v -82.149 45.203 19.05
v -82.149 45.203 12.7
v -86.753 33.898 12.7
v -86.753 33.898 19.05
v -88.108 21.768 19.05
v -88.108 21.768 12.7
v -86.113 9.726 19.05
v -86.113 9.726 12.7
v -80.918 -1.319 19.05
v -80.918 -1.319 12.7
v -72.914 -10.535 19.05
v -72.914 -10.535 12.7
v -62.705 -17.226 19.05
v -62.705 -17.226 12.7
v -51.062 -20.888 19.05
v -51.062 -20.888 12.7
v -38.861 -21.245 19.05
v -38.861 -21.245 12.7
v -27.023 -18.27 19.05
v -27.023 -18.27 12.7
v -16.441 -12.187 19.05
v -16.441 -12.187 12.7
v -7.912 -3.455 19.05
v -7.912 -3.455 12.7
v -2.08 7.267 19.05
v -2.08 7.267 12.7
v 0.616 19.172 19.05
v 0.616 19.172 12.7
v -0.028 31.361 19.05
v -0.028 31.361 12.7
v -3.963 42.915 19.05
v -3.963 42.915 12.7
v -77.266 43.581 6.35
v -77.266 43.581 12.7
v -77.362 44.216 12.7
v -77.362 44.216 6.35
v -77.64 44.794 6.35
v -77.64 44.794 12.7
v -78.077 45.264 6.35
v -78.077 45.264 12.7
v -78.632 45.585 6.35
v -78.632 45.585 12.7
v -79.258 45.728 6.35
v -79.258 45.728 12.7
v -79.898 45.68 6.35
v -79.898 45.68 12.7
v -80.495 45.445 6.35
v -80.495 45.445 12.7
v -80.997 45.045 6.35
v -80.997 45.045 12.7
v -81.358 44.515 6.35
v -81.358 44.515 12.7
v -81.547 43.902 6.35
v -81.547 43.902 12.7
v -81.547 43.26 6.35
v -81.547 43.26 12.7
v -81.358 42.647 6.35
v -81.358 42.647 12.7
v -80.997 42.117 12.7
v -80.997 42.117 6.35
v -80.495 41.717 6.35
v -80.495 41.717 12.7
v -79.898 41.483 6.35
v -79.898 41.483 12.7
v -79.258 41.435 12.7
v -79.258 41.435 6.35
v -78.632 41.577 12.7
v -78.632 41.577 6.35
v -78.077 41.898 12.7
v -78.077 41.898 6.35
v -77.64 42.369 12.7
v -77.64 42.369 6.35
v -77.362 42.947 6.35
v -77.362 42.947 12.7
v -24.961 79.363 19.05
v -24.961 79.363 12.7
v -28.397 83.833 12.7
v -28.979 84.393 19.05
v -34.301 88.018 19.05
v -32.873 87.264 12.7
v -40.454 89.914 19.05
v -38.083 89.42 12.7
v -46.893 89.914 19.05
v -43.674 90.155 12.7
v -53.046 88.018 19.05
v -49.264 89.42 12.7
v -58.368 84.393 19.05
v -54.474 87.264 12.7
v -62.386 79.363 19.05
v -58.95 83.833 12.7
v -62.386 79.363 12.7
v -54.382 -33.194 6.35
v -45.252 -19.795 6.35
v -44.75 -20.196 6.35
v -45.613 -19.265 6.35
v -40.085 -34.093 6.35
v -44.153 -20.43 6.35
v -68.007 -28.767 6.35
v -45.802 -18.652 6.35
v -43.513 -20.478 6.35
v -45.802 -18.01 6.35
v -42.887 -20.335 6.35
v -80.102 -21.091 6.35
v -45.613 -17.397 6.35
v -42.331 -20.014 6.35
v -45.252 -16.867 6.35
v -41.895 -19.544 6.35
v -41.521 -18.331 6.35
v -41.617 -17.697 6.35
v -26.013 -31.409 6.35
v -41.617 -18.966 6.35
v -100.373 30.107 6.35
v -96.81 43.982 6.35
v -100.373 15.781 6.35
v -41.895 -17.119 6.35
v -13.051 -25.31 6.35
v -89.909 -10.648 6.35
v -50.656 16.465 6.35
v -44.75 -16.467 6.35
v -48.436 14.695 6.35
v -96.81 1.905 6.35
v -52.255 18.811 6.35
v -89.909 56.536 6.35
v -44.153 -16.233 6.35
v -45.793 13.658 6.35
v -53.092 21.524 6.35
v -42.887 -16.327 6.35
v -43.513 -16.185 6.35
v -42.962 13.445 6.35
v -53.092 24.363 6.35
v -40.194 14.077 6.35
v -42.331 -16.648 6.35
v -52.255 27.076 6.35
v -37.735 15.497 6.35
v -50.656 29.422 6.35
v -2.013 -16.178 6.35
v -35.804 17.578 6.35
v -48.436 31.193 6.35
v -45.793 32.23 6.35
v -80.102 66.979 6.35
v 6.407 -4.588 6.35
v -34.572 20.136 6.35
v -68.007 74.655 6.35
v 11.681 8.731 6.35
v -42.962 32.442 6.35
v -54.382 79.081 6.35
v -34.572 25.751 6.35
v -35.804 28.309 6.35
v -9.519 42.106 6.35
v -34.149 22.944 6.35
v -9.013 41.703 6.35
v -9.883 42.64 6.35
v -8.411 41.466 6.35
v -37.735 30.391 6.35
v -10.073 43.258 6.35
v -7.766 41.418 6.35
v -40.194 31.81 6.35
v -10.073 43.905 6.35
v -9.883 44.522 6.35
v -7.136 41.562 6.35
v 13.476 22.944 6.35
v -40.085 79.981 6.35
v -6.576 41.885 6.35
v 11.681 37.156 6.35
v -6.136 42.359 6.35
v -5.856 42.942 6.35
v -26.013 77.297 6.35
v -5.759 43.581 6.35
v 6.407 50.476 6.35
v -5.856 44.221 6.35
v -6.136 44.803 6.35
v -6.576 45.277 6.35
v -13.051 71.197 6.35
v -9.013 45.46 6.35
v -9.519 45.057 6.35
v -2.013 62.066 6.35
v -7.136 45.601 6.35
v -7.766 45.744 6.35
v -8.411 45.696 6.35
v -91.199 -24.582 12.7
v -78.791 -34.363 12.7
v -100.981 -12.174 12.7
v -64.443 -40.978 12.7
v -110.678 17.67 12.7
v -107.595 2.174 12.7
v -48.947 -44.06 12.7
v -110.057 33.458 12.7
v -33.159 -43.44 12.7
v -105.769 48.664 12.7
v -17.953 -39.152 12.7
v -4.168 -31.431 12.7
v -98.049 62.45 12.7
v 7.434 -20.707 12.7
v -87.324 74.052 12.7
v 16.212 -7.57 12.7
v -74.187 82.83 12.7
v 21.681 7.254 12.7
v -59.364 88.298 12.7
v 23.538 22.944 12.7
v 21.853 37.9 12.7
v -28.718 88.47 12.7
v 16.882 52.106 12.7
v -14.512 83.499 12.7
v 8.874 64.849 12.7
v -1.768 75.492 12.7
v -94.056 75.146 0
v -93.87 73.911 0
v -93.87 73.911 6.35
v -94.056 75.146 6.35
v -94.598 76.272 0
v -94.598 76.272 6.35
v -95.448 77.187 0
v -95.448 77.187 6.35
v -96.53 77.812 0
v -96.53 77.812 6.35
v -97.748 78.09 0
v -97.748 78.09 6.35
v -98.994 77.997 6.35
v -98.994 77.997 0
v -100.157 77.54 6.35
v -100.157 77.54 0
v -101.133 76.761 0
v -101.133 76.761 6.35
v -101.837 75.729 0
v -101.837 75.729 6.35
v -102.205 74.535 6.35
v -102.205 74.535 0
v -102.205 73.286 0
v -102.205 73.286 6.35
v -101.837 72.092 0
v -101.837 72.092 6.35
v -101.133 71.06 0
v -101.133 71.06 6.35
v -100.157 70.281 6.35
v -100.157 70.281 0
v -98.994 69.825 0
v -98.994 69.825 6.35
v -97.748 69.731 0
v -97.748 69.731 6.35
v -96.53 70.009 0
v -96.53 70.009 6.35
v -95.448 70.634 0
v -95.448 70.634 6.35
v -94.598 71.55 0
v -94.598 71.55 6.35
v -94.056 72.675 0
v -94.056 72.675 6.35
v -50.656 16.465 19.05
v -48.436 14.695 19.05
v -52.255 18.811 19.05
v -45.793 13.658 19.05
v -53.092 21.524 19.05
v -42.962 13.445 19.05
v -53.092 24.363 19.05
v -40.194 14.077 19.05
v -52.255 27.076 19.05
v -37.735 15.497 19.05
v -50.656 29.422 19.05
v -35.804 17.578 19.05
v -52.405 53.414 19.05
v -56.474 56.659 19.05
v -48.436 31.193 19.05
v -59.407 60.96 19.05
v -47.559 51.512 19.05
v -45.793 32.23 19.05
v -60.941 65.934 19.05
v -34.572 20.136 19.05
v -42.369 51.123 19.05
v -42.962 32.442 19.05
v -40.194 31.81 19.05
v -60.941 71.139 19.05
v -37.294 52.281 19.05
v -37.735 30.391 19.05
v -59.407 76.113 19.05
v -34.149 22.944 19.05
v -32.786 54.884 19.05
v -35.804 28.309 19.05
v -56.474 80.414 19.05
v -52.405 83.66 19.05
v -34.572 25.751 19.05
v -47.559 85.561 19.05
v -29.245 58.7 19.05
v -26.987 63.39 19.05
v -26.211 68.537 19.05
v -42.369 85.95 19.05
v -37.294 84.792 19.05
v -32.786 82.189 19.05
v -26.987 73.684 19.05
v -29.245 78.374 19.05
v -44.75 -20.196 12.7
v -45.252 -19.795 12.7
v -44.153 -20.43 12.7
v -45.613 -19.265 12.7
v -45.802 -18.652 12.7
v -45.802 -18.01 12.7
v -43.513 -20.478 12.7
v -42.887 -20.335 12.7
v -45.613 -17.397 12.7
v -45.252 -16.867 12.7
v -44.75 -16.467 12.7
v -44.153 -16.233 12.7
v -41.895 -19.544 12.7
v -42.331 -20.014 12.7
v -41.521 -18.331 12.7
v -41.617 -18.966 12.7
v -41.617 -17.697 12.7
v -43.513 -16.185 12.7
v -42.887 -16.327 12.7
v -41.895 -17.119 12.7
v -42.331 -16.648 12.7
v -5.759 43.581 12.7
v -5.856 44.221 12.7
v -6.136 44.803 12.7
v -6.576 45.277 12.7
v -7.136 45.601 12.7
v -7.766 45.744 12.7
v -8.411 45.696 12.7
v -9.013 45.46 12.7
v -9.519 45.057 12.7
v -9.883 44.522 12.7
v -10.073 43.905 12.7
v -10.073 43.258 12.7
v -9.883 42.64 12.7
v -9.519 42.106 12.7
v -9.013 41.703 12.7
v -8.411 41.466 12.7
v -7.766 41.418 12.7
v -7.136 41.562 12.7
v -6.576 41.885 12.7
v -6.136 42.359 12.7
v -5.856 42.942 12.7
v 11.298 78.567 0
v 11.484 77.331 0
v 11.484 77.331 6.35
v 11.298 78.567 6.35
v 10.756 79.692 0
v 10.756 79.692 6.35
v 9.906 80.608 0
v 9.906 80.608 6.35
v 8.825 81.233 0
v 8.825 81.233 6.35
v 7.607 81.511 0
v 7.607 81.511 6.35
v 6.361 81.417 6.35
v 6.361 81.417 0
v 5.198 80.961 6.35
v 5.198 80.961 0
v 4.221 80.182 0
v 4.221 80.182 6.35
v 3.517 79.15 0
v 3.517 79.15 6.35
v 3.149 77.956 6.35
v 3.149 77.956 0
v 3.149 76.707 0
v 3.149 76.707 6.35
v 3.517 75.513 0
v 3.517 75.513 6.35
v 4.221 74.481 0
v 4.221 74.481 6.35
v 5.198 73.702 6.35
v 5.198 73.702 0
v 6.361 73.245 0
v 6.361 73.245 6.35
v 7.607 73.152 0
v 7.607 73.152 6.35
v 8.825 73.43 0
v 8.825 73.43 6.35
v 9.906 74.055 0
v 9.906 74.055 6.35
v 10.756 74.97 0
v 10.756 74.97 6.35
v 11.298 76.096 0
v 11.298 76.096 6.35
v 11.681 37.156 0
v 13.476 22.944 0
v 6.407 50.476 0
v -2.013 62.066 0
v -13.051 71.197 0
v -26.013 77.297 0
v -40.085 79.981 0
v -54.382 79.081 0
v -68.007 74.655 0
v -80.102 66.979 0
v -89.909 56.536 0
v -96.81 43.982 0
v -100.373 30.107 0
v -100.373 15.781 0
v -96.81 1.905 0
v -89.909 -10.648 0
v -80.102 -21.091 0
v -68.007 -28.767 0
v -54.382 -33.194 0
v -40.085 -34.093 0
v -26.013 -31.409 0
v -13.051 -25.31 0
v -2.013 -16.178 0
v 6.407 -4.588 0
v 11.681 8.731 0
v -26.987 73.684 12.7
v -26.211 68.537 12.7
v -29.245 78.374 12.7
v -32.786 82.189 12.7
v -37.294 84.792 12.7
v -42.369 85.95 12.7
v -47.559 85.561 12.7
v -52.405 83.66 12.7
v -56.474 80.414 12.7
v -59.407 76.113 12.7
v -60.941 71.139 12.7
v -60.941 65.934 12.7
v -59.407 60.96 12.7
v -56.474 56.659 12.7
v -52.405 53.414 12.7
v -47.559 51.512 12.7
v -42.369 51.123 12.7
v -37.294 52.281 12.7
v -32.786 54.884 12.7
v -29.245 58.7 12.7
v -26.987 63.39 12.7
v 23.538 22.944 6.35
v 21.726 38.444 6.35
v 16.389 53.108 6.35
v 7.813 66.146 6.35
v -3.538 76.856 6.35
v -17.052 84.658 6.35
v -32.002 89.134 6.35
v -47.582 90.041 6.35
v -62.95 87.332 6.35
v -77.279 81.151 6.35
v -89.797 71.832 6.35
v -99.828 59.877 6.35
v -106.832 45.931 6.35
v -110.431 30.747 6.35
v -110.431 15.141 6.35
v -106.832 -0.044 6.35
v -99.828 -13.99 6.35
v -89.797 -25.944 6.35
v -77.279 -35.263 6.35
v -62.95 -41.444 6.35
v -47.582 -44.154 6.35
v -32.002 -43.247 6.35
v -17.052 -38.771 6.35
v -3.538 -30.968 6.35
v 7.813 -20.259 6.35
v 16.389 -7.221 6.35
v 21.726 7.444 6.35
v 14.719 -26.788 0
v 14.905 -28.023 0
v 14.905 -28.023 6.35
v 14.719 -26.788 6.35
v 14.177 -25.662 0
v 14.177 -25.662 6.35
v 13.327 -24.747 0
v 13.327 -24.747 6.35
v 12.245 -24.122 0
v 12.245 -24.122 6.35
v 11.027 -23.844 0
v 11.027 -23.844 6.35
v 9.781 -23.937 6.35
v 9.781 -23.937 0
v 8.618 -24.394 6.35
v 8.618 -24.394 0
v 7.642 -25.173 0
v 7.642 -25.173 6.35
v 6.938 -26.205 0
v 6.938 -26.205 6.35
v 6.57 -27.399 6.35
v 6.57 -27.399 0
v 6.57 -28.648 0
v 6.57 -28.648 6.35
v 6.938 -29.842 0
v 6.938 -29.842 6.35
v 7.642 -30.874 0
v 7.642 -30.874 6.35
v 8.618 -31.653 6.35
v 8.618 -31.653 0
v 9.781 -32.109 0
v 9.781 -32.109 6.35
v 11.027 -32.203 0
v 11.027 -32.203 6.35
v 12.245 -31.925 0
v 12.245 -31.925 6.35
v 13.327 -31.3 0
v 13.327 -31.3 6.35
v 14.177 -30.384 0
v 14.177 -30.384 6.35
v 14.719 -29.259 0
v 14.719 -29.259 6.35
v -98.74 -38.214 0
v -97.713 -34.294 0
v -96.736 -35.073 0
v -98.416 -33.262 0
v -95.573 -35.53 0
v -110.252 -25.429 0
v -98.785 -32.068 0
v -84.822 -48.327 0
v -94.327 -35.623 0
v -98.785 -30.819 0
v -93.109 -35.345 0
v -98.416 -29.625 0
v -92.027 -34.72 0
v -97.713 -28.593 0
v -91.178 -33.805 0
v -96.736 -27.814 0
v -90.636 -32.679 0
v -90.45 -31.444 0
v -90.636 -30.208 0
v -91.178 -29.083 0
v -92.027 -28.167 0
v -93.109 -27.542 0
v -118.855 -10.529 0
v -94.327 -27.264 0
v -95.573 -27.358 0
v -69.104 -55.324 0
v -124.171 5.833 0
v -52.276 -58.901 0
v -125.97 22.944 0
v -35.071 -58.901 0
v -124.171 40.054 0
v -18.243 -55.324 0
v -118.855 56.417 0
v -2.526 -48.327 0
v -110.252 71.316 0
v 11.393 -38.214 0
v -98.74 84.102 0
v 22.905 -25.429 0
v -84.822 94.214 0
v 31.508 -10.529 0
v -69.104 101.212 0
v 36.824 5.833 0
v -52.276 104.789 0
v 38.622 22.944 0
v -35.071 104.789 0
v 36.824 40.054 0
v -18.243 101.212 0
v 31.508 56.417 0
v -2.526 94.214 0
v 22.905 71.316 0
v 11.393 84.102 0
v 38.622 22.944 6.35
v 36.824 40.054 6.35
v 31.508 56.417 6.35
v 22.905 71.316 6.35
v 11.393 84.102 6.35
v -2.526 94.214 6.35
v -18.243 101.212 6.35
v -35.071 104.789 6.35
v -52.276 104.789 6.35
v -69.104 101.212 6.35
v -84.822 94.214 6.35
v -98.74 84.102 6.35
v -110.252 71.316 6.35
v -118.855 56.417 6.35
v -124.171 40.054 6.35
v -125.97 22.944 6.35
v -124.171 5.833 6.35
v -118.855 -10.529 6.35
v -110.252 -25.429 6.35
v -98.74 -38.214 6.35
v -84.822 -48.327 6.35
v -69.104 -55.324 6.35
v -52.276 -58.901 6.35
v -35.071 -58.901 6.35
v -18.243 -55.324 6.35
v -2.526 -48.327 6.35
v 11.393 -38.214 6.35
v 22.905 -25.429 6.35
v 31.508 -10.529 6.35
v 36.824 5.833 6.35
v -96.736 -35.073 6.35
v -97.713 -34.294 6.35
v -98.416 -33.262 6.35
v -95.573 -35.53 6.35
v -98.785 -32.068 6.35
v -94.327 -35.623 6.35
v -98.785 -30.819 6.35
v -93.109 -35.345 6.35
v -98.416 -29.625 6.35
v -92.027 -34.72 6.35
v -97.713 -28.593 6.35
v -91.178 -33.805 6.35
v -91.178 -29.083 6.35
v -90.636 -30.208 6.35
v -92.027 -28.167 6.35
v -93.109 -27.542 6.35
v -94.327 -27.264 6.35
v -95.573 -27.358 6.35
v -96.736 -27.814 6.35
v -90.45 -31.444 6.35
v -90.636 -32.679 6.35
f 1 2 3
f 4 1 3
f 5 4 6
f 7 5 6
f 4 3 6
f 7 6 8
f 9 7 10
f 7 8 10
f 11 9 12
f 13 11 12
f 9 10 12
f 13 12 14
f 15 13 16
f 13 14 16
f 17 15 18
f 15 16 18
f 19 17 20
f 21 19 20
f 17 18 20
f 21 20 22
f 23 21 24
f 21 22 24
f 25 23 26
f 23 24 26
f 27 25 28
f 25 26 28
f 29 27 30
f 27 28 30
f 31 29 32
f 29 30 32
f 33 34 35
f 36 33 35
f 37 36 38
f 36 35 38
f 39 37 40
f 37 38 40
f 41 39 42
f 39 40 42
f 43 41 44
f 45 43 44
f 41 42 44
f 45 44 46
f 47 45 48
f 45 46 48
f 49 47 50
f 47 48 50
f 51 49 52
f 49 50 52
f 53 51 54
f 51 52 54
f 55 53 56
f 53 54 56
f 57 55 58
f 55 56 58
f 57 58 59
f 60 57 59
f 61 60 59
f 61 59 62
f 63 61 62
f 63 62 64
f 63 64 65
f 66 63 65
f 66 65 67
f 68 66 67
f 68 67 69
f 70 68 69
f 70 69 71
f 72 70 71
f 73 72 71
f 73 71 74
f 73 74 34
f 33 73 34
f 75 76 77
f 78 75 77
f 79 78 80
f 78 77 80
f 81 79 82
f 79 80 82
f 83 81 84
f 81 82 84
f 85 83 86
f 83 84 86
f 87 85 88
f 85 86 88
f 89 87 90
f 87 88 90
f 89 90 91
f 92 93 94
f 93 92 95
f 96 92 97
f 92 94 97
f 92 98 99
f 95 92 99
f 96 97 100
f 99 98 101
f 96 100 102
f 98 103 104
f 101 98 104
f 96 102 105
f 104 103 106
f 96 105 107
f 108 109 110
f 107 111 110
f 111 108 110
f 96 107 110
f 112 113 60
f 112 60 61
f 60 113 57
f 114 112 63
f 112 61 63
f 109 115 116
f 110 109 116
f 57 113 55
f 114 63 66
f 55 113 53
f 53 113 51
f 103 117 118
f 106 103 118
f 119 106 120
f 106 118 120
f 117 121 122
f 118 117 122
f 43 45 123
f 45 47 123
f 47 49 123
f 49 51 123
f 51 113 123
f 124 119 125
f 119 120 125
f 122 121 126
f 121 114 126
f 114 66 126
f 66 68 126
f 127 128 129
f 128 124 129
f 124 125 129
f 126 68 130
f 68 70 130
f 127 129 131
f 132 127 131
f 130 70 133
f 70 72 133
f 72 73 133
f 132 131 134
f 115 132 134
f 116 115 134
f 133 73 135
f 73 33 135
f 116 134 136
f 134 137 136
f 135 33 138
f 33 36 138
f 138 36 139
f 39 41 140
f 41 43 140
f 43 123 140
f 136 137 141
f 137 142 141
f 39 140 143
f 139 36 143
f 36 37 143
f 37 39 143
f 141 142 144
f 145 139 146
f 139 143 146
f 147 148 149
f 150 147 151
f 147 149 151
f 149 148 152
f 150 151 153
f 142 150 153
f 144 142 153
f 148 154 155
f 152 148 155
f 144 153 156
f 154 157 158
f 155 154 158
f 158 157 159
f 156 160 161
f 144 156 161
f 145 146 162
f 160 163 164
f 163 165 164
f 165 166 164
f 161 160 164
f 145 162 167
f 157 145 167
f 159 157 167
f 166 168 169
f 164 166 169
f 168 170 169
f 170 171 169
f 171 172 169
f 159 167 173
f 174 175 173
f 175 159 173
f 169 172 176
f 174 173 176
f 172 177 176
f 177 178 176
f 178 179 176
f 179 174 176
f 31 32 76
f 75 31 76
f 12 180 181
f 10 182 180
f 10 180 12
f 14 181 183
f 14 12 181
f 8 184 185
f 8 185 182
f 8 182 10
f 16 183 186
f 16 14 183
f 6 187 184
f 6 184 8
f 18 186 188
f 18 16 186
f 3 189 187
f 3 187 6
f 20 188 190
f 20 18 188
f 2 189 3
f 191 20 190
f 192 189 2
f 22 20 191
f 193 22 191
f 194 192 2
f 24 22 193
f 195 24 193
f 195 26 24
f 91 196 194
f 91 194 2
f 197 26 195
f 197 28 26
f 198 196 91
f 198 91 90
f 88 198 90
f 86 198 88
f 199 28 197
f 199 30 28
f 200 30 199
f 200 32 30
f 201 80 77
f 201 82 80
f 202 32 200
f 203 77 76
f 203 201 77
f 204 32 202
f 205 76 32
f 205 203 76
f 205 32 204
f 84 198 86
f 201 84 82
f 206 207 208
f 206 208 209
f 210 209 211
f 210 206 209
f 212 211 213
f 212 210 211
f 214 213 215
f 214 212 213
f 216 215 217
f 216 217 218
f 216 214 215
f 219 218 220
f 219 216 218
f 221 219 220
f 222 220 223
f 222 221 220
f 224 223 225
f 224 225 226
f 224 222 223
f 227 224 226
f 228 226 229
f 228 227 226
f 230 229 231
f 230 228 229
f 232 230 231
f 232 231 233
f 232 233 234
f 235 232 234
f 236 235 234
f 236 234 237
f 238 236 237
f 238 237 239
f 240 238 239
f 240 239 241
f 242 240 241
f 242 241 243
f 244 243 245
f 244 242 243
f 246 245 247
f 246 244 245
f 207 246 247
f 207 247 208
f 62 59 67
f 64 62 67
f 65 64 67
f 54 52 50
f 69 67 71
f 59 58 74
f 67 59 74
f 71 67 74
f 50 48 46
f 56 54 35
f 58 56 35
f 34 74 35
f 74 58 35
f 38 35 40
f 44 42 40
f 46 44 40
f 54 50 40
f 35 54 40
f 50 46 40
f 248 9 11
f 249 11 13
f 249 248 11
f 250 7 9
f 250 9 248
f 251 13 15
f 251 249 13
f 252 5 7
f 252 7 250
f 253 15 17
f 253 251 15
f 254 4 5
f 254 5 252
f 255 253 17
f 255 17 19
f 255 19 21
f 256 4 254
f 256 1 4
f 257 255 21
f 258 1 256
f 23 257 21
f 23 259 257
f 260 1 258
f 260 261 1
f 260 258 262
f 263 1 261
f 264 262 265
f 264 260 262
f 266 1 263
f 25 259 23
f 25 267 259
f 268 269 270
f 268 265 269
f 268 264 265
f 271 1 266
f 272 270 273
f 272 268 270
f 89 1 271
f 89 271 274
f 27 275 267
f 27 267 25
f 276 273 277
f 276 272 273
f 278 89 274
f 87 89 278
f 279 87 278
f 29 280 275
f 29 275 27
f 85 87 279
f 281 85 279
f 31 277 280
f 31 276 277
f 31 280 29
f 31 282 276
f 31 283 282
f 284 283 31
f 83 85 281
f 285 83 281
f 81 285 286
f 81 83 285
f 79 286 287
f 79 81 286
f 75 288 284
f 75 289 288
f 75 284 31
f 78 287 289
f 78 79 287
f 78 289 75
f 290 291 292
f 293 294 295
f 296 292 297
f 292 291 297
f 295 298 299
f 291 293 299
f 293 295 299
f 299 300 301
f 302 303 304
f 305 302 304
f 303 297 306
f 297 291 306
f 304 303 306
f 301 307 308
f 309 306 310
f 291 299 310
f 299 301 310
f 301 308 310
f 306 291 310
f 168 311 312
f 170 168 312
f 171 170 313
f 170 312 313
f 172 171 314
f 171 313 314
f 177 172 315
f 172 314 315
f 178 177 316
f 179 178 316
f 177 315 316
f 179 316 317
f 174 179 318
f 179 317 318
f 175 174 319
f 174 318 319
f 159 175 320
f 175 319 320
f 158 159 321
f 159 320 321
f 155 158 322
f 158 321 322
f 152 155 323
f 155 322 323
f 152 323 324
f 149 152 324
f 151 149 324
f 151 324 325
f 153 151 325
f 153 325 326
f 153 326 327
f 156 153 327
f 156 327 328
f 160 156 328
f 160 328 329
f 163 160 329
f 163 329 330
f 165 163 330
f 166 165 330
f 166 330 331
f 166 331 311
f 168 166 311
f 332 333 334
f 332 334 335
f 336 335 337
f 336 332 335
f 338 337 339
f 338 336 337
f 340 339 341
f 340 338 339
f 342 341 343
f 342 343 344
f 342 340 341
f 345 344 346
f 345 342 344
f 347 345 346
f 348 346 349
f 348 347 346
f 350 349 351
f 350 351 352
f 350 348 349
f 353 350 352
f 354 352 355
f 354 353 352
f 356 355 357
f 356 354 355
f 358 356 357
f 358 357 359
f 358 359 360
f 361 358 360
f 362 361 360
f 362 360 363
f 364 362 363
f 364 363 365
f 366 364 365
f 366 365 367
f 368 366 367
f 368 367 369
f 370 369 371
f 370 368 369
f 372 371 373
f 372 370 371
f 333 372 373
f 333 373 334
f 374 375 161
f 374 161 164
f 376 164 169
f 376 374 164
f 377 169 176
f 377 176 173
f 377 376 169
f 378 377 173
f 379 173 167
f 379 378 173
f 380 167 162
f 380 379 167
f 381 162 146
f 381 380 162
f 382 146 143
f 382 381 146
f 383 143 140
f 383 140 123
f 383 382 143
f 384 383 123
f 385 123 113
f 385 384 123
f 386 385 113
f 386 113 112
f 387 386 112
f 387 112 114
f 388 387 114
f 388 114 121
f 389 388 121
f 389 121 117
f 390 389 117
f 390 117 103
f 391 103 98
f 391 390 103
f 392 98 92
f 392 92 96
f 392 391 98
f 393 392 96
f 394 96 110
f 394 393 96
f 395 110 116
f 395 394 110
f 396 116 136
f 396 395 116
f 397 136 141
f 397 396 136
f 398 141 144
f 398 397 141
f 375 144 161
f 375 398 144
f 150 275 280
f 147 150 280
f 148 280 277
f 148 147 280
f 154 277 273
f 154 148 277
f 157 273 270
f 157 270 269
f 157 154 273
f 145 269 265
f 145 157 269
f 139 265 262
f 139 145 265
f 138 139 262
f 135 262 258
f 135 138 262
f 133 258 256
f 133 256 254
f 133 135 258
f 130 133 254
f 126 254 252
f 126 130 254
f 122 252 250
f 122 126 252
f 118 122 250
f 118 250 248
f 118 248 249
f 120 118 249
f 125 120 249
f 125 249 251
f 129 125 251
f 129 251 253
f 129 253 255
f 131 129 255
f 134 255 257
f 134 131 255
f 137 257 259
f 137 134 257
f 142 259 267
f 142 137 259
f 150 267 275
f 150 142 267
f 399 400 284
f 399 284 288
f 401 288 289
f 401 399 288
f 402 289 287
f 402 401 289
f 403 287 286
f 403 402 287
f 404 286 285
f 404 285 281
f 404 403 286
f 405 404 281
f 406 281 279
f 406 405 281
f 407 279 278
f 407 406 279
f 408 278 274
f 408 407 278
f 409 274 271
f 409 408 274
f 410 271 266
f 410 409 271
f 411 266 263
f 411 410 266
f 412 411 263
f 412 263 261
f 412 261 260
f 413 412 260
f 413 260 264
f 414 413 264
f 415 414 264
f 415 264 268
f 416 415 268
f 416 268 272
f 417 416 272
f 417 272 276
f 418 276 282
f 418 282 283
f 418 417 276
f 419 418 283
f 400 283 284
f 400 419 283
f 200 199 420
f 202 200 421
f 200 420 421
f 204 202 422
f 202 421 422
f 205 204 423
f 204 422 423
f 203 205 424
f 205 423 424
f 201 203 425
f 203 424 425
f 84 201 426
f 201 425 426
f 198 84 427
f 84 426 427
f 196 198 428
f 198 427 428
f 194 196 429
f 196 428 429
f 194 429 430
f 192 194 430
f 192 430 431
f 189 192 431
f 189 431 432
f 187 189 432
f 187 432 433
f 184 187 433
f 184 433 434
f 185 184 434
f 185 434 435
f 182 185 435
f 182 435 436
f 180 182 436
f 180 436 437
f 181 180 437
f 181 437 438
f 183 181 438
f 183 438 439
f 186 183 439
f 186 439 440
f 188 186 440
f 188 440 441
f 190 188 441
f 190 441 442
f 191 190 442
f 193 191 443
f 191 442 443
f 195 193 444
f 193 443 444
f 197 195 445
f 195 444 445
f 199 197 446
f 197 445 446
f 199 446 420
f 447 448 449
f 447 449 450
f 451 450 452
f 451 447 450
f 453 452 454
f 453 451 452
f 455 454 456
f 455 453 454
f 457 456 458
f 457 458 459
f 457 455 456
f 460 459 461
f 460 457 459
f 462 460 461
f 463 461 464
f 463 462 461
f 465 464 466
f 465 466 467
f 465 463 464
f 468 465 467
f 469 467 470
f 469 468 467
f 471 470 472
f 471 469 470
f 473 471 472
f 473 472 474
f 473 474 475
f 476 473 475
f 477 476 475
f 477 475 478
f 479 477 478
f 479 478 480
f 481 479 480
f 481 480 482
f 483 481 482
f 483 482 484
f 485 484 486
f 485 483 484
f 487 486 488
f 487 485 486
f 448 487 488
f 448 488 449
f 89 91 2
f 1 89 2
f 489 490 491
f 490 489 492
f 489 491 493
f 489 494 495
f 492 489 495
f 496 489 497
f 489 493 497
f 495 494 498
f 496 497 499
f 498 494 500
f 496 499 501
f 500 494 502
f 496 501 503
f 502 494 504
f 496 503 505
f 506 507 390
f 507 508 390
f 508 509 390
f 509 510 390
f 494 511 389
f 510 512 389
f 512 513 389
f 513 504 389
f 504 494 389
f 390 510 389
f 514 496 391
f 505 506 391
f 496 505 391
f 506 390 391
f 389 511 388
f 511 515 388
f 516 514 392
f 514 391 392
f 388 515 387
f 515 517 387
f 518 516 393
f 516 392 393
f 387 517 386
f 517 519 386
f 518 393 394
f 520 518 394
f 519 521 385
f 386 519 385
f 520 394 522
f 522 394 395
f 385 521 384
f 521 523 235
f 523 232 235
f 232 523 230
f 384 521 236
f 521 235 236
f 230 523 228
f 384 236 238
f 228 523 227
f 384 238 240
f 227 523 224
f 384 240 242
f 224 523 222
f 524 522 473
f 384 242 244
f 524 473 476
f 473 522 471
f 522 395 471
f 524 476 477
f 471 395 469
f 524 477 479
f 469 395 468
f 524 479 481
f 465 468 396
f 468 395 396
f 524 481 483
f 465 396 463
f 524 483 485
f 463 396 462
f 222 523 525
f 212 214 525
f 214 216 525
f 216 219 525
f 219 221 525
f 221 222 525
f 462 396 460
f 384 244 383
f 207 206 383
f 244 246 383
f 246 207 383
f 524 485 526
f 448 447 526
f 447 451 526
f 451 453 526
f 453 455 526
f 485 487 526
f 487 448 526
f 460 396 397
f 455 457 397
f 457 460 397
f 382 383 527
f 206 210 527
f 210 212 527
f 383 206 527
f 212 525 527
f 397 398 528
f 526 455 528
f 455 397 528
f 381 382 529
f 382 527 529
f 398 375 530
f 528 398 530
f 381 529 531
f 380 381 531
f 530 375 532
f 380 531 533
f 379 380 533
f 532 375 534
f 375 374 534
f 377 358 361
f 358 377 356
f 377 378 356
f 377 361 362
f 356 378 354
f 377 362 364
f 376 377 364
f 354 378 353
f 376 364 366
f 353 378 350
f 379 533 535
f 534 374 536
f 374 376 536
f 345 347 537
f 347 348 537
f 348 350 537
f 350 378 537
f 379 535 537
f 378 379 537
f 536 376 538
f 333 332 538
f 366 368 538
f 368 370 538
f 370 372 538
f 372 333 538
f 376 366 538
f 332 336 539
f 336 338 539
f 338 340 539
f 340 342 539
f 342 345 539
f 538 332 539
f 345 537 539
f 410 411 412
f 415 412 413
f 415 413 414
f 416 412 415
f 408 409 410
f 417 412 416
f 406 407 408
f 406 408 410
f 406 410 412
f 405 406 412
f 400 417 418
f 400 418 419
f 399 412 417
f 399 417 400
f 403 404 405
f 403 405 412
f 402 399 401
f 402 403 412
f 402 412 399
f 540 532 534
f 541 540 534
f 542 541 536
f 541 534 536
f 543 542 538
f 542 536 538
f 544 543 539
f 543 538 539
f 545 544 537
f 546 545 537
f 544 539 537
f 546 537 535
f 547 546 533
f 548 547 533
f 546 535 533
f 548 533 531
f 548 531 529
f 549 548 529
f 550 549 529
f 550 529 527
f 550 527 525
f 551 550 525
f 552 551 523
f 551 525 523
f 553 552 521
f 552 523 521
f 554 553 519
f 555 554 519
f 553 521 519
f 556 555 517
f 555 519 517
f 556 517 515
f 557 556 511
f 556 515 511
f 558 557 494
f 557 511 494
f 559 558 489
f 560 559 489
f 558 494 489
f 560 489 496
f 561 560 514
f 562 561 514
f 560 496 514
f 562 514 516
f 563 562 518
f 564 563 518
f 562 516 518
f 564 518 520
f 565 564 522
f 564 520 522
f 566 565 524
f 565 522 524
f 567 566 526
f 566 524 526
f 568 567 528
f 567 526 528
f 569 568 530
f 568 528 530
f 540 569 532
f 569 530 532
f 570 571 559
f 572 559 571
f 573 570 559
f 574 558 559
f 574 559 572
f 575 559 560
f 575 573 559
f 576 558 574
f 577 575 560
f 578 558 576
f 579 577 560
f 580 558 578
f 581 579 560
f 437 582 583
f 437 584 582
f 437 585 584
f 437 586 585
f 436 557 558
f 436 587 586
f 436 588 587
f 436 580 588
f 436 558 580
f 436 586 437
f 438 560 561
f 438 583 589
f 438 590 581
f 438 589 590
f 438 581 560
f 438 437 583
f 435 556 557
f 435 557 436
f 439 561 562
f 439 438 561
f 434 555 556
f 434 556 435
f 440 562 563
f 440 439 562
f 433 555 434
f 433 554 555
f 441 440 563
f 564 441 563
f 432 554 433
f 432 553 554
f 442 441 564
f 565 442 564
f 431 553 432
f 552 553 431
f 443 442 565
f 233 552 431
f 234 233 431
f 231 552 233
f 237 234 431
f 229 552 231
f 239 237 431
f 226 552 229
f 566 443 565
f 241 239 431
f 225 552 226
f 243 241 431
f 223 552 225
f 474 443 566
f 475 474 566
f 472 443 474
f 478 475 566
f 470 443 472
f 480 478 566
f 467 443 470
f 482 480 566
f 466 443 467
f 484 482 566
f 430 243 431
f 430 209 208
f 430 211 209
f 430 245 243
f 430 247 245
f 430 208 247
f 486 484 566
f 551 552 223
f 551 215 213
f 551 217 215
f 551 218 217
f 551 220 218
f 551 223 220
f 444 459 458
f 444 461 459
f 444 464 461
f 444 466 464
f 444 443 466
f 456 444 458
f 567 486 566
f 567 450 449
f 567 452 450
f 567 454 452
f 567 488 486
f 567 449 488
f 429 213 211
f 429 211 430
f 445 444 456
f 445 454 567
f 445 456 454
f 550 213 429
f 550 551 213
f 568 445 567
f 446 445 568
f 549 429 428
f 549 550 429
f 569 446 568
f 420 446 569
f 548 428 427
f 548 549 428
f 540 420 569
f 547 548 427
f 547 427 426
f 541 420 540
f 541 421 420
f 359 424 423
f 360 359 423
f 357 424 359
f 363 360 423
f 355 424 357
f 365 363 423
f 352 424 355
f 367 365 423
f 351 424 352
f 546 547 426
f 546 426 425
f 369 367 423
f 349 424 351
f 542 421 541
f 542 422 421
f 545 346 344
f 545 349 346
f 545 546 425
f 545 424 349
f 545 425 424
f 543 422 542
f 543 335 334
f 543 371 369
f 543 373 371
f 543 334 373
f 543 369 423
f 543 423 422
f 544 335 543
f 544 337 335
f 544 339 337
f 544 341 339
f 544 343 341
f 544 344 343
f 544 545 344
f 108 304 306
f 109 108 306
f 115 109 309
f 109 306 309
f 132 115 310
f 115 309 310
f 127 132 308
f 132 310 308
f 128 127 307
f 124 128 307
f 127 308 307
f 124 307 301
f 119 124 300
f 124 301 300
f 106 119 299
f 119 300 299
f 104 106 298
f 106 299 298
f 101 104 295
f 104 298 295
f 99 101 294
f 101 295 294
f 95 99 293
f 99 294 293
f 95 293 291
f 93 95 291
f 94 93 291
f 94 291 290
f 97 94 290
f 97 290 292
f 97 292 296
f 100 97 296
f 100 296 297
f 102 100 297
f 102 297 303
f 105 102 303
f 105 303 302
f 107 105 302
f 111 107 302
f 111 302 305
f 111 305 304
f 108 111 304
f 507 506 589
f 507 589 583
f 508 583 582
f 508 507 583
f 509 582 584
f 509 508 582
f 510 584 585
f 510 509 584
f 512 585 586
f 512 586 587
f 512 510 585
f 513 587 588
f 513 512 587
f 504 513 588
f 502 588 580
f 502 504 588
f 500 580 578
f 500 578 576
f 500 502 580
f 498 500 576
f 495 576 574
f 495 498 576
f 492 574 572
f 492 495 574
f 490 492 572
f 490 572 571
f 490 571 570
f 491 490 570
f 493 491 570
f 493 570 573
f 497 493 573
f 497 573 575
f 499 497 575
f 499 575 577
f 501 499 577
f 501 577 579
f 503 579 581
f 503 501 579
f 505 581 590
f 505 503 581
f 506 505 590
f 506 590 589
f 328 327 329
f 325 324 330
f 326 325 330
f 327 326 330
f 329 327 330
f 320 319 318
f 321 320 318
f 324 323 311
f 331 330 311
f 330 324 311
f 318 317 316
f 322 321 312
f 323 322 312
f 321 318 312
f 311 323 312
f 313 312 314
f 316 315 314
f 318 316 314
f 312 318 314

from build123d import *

# Parameters (mm, degrees)
SKETCH1_R           = 82.296
SKETCH1_R_2         = 57.15
SKETCH1_R_3         = 4.191
BOSS_EXTRUDE1_DEPTH = 6.35
SKETCH2_R           = 67.211414491
SKETCH2_R_2         = 9.525
BOSS_EXTRUDE2_DEPTH = 6.35
SKETCH3_R           = 9.525
SKETCH3_R_2         = 17.4625
BOSS_EXTRUDE3_DEPTH = 6.35
SKETCH4_R           = 2.15265
SKETCH4_R_2         = 2.169226356
CUT_EXTRUDE1_DEPTH  = 13.97


with BuildPart() as part:
    # Sketch1 → Boss-Extrude1 (new body)
    with BuildSketch(Plane.XY):
        with Locations((-43.673560496, 22.943742375)):
            Circle(SKETCH1_R)
        with Locations((-43.673560496, 22.943742375)):
            Circle(SKETCH1_R_2, mode=Mode.SUBTRACT)
        with Locations((-98.06108088, 73.910708897)):
            Circle(SKETCH1_R_3, mode=Mode.SUBTRACT)
        with Locations((7.293406026, 77.331262758)):
            Circle(SKETCH1_R_3, mode=Mode.SUBTRACT)
        with Locations((10.713959888, -28.023224148)):
            Circle(SKETCH1_R_3, mode=Mode.SUBTRACT)
        with Locations((-94.640527019, -31.443778009)):
            Circle(SKETCH1_R_3, mode=Mode.SUBTRACT)
    extrude(amount=BOSS_EXTRUDE1_DEPTH)

    # Sketch2 → Boss-Extrude2 (add)
    with BuildSketch(Plane.XY.offset(6.35)):
        with Locations((-43.673560496, 22.943742375)):
            Circle(SKETCH2_R)
        with Locations((-43.673560496, 22.943742375)):
            Circle(SKETCH2_R_2, mode=Mode.SUBTRACT)
    extrude(amount=BOSS_EXTRUDE2_DEPTH)

    # Sketch3 → Boss-Extrude3 (add)
    with BuildSketch(Plane.XY.offset(12.7)):
        with BuildLine():
            Line((-3.962770655, 42.915113639), (-24.961079117, 79.362585794))
            ThreePointArc((-24.961079117, 79.362585794), (-43.673560496, 90.155156865), (-62.386041875, 79.362585794))
            Line((-62.386041875, 79.362585794), (-82.148620619, 45.202948303))
            ThreePointArc((-82.148620619, 45.202948303), (-44.973677355, -21.487240016), (-3.962770655, 42.915113639))
        make_face()
        with Locations((-43.673560496, 22.943742375)):
            Circle(SKETCH3_R, mode=Mode.SUBTRACT)
        with Locations((-43.673560496, 68.536742375)):
            Circle(SKETCH3_R_2, mode=Mode.SUBTRACT)
    extrude(amount=BOSS_EXTRUDE3_DEPTH)

    # Sketch4 → Cut-Extrude1 (cut)
    with BuildSketch(Plane.XY.offset(12.7)):
        with Locations((-79.418759037, 43.581242375)):
            Circle(SKETCH4_R)
        with Locations((-7.928361955, 43.581242375)):
            Circle(SKETCH4_R_2)
        with Locations((-43.673560496, -18.331257625)):
            Circle(SKETCH4_R)
    extrude(amount=-CUT_EXTRUDE1_DEPTH, mode=Mode.SUBTRACT)


solid = part.part
